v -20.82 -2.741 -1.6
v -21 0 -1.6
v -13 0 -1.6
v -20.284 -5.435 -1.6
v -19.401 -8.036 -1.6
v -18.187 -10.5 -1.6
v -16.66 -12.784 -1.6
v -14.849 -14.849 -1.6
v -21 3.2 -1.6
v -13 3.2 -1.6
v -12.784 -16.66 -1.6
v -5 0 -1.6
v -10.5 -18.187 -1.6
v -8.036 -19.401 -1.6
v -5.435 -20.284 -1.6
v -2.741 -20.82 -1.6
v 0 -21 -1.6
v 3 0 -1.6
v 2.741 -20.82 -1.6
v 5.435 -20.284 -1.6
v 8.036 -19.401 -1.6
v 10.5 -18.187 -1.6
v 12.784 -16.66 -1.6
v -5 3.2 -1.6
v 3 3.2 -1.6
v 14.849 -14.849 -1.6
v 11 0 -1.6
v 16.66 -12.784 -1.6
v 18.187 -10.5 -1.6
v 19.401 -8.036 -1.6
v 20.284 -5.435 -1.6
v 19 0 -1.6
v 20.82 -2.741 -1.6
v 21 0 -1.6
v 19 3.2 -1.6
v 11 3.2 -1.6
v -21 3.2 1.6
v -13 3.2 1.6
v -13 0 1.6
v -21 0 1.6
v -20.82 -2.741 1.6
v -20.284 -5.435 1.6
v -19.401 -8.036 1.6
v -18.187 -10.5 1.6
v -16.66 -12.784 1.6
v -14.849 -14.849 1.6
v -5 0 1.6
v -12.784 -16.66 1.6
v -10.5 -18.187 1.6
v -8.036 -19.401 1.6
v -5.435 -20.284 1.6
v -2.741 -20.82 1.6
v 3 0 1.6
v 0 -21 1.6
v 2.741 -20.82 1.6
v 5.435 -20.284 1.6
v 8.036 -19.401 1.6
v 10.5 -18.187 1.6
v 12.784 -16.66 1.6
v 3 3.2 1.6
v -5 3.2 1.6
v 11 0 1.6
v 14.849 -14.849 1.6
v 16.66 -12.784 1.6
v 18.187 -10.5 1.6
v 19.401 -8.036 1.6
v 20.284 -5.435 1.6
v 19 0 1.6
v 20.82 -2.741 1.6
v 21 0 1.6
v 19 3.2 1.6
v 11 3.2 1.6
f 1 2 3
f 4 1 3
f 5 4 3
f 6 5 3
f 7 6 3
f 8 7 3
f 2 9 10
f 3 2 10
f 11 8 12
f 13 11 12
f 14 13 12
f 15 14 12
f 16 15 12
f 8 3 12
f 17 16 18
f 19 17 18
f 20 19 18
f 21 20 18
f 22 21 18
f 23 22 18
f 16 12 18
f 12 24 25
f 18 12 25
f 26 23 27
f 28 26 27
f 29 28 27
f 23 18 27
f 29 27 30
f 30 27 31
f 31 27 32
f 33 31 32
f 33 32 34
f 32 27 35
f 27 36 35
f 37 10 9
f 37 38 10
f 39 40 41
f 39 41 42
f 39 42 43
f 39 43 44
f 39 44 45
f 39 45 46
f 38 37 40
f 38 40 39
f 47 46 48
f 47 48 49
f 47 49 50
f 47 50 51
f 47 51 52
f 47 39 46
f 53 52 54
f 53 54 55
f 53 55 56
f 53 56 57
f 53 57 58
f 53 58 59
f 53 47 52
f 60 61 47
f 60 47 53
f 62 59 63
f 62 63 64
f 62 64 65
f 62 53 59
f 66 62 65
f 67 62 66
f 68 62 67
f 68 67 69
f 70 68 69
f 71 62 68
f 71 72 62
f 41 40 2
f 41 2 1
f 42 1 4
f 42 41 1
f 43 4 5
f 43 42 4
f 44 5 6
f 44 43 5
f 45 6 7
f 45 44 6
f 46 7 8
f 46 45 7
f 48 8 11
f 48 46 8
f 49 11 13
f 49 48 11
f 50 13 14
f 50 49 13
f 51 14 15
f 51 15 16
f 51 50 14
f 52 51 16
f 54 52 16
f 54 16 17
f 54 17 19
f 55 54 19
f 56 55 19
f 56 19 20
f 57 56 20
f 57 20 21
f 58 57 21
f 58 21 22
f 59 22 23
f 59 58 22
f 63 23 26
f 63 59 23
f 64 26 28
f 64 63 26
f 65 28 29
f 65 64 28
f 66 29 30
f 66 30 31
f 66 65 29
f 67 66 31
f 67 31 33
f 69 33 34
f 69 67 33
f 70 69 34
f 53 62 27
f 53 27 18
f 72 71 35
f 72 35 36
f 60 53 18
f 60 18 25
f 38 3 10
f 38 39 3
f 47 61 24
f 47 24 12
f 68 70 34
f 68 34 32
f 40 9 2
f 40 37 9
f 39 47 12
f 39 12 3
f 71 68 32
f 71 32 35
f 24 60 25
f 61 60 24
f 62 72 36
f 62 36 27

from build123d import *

# Parameters (mm, degrees)
F1_DEPTH = 1.6


# Not quite as in the source:
# - a feature names something its author has since deleted; it is built from what else it names


with BuildPart() as f1:
    # F0 (on Top) → F1 (new body, symmetric)
    with BuildSketch(Plane.XY):
        with BuildLine():
            Line((-21, 3.2), (-21, 0))
            ThreePointArc((-21, 0), (0, -21), (21, 0))
            Line((21, 0), (19, 0))
            Line((19, 0), (19, 3.2))
            Line((19, 3.2), (11, 3.2))
            Line((11, 3.2), (11, 0))
            Line((11, 0), (3, 0))
            Line((3, 0), (3, 3.2))
            Line((3, 3.2), (-5, 3.2))
            Line((-5, 3.2), (-5, 0))
            Line((-5, 0), (-13, 0))
            Line((-13, 0), (-13, 3.2))
            Line((-13, 3.2), (-21, 3.2))
        make_face()
    extrude(amount=F1_DEPTH, both=True)


solid = f1.part
